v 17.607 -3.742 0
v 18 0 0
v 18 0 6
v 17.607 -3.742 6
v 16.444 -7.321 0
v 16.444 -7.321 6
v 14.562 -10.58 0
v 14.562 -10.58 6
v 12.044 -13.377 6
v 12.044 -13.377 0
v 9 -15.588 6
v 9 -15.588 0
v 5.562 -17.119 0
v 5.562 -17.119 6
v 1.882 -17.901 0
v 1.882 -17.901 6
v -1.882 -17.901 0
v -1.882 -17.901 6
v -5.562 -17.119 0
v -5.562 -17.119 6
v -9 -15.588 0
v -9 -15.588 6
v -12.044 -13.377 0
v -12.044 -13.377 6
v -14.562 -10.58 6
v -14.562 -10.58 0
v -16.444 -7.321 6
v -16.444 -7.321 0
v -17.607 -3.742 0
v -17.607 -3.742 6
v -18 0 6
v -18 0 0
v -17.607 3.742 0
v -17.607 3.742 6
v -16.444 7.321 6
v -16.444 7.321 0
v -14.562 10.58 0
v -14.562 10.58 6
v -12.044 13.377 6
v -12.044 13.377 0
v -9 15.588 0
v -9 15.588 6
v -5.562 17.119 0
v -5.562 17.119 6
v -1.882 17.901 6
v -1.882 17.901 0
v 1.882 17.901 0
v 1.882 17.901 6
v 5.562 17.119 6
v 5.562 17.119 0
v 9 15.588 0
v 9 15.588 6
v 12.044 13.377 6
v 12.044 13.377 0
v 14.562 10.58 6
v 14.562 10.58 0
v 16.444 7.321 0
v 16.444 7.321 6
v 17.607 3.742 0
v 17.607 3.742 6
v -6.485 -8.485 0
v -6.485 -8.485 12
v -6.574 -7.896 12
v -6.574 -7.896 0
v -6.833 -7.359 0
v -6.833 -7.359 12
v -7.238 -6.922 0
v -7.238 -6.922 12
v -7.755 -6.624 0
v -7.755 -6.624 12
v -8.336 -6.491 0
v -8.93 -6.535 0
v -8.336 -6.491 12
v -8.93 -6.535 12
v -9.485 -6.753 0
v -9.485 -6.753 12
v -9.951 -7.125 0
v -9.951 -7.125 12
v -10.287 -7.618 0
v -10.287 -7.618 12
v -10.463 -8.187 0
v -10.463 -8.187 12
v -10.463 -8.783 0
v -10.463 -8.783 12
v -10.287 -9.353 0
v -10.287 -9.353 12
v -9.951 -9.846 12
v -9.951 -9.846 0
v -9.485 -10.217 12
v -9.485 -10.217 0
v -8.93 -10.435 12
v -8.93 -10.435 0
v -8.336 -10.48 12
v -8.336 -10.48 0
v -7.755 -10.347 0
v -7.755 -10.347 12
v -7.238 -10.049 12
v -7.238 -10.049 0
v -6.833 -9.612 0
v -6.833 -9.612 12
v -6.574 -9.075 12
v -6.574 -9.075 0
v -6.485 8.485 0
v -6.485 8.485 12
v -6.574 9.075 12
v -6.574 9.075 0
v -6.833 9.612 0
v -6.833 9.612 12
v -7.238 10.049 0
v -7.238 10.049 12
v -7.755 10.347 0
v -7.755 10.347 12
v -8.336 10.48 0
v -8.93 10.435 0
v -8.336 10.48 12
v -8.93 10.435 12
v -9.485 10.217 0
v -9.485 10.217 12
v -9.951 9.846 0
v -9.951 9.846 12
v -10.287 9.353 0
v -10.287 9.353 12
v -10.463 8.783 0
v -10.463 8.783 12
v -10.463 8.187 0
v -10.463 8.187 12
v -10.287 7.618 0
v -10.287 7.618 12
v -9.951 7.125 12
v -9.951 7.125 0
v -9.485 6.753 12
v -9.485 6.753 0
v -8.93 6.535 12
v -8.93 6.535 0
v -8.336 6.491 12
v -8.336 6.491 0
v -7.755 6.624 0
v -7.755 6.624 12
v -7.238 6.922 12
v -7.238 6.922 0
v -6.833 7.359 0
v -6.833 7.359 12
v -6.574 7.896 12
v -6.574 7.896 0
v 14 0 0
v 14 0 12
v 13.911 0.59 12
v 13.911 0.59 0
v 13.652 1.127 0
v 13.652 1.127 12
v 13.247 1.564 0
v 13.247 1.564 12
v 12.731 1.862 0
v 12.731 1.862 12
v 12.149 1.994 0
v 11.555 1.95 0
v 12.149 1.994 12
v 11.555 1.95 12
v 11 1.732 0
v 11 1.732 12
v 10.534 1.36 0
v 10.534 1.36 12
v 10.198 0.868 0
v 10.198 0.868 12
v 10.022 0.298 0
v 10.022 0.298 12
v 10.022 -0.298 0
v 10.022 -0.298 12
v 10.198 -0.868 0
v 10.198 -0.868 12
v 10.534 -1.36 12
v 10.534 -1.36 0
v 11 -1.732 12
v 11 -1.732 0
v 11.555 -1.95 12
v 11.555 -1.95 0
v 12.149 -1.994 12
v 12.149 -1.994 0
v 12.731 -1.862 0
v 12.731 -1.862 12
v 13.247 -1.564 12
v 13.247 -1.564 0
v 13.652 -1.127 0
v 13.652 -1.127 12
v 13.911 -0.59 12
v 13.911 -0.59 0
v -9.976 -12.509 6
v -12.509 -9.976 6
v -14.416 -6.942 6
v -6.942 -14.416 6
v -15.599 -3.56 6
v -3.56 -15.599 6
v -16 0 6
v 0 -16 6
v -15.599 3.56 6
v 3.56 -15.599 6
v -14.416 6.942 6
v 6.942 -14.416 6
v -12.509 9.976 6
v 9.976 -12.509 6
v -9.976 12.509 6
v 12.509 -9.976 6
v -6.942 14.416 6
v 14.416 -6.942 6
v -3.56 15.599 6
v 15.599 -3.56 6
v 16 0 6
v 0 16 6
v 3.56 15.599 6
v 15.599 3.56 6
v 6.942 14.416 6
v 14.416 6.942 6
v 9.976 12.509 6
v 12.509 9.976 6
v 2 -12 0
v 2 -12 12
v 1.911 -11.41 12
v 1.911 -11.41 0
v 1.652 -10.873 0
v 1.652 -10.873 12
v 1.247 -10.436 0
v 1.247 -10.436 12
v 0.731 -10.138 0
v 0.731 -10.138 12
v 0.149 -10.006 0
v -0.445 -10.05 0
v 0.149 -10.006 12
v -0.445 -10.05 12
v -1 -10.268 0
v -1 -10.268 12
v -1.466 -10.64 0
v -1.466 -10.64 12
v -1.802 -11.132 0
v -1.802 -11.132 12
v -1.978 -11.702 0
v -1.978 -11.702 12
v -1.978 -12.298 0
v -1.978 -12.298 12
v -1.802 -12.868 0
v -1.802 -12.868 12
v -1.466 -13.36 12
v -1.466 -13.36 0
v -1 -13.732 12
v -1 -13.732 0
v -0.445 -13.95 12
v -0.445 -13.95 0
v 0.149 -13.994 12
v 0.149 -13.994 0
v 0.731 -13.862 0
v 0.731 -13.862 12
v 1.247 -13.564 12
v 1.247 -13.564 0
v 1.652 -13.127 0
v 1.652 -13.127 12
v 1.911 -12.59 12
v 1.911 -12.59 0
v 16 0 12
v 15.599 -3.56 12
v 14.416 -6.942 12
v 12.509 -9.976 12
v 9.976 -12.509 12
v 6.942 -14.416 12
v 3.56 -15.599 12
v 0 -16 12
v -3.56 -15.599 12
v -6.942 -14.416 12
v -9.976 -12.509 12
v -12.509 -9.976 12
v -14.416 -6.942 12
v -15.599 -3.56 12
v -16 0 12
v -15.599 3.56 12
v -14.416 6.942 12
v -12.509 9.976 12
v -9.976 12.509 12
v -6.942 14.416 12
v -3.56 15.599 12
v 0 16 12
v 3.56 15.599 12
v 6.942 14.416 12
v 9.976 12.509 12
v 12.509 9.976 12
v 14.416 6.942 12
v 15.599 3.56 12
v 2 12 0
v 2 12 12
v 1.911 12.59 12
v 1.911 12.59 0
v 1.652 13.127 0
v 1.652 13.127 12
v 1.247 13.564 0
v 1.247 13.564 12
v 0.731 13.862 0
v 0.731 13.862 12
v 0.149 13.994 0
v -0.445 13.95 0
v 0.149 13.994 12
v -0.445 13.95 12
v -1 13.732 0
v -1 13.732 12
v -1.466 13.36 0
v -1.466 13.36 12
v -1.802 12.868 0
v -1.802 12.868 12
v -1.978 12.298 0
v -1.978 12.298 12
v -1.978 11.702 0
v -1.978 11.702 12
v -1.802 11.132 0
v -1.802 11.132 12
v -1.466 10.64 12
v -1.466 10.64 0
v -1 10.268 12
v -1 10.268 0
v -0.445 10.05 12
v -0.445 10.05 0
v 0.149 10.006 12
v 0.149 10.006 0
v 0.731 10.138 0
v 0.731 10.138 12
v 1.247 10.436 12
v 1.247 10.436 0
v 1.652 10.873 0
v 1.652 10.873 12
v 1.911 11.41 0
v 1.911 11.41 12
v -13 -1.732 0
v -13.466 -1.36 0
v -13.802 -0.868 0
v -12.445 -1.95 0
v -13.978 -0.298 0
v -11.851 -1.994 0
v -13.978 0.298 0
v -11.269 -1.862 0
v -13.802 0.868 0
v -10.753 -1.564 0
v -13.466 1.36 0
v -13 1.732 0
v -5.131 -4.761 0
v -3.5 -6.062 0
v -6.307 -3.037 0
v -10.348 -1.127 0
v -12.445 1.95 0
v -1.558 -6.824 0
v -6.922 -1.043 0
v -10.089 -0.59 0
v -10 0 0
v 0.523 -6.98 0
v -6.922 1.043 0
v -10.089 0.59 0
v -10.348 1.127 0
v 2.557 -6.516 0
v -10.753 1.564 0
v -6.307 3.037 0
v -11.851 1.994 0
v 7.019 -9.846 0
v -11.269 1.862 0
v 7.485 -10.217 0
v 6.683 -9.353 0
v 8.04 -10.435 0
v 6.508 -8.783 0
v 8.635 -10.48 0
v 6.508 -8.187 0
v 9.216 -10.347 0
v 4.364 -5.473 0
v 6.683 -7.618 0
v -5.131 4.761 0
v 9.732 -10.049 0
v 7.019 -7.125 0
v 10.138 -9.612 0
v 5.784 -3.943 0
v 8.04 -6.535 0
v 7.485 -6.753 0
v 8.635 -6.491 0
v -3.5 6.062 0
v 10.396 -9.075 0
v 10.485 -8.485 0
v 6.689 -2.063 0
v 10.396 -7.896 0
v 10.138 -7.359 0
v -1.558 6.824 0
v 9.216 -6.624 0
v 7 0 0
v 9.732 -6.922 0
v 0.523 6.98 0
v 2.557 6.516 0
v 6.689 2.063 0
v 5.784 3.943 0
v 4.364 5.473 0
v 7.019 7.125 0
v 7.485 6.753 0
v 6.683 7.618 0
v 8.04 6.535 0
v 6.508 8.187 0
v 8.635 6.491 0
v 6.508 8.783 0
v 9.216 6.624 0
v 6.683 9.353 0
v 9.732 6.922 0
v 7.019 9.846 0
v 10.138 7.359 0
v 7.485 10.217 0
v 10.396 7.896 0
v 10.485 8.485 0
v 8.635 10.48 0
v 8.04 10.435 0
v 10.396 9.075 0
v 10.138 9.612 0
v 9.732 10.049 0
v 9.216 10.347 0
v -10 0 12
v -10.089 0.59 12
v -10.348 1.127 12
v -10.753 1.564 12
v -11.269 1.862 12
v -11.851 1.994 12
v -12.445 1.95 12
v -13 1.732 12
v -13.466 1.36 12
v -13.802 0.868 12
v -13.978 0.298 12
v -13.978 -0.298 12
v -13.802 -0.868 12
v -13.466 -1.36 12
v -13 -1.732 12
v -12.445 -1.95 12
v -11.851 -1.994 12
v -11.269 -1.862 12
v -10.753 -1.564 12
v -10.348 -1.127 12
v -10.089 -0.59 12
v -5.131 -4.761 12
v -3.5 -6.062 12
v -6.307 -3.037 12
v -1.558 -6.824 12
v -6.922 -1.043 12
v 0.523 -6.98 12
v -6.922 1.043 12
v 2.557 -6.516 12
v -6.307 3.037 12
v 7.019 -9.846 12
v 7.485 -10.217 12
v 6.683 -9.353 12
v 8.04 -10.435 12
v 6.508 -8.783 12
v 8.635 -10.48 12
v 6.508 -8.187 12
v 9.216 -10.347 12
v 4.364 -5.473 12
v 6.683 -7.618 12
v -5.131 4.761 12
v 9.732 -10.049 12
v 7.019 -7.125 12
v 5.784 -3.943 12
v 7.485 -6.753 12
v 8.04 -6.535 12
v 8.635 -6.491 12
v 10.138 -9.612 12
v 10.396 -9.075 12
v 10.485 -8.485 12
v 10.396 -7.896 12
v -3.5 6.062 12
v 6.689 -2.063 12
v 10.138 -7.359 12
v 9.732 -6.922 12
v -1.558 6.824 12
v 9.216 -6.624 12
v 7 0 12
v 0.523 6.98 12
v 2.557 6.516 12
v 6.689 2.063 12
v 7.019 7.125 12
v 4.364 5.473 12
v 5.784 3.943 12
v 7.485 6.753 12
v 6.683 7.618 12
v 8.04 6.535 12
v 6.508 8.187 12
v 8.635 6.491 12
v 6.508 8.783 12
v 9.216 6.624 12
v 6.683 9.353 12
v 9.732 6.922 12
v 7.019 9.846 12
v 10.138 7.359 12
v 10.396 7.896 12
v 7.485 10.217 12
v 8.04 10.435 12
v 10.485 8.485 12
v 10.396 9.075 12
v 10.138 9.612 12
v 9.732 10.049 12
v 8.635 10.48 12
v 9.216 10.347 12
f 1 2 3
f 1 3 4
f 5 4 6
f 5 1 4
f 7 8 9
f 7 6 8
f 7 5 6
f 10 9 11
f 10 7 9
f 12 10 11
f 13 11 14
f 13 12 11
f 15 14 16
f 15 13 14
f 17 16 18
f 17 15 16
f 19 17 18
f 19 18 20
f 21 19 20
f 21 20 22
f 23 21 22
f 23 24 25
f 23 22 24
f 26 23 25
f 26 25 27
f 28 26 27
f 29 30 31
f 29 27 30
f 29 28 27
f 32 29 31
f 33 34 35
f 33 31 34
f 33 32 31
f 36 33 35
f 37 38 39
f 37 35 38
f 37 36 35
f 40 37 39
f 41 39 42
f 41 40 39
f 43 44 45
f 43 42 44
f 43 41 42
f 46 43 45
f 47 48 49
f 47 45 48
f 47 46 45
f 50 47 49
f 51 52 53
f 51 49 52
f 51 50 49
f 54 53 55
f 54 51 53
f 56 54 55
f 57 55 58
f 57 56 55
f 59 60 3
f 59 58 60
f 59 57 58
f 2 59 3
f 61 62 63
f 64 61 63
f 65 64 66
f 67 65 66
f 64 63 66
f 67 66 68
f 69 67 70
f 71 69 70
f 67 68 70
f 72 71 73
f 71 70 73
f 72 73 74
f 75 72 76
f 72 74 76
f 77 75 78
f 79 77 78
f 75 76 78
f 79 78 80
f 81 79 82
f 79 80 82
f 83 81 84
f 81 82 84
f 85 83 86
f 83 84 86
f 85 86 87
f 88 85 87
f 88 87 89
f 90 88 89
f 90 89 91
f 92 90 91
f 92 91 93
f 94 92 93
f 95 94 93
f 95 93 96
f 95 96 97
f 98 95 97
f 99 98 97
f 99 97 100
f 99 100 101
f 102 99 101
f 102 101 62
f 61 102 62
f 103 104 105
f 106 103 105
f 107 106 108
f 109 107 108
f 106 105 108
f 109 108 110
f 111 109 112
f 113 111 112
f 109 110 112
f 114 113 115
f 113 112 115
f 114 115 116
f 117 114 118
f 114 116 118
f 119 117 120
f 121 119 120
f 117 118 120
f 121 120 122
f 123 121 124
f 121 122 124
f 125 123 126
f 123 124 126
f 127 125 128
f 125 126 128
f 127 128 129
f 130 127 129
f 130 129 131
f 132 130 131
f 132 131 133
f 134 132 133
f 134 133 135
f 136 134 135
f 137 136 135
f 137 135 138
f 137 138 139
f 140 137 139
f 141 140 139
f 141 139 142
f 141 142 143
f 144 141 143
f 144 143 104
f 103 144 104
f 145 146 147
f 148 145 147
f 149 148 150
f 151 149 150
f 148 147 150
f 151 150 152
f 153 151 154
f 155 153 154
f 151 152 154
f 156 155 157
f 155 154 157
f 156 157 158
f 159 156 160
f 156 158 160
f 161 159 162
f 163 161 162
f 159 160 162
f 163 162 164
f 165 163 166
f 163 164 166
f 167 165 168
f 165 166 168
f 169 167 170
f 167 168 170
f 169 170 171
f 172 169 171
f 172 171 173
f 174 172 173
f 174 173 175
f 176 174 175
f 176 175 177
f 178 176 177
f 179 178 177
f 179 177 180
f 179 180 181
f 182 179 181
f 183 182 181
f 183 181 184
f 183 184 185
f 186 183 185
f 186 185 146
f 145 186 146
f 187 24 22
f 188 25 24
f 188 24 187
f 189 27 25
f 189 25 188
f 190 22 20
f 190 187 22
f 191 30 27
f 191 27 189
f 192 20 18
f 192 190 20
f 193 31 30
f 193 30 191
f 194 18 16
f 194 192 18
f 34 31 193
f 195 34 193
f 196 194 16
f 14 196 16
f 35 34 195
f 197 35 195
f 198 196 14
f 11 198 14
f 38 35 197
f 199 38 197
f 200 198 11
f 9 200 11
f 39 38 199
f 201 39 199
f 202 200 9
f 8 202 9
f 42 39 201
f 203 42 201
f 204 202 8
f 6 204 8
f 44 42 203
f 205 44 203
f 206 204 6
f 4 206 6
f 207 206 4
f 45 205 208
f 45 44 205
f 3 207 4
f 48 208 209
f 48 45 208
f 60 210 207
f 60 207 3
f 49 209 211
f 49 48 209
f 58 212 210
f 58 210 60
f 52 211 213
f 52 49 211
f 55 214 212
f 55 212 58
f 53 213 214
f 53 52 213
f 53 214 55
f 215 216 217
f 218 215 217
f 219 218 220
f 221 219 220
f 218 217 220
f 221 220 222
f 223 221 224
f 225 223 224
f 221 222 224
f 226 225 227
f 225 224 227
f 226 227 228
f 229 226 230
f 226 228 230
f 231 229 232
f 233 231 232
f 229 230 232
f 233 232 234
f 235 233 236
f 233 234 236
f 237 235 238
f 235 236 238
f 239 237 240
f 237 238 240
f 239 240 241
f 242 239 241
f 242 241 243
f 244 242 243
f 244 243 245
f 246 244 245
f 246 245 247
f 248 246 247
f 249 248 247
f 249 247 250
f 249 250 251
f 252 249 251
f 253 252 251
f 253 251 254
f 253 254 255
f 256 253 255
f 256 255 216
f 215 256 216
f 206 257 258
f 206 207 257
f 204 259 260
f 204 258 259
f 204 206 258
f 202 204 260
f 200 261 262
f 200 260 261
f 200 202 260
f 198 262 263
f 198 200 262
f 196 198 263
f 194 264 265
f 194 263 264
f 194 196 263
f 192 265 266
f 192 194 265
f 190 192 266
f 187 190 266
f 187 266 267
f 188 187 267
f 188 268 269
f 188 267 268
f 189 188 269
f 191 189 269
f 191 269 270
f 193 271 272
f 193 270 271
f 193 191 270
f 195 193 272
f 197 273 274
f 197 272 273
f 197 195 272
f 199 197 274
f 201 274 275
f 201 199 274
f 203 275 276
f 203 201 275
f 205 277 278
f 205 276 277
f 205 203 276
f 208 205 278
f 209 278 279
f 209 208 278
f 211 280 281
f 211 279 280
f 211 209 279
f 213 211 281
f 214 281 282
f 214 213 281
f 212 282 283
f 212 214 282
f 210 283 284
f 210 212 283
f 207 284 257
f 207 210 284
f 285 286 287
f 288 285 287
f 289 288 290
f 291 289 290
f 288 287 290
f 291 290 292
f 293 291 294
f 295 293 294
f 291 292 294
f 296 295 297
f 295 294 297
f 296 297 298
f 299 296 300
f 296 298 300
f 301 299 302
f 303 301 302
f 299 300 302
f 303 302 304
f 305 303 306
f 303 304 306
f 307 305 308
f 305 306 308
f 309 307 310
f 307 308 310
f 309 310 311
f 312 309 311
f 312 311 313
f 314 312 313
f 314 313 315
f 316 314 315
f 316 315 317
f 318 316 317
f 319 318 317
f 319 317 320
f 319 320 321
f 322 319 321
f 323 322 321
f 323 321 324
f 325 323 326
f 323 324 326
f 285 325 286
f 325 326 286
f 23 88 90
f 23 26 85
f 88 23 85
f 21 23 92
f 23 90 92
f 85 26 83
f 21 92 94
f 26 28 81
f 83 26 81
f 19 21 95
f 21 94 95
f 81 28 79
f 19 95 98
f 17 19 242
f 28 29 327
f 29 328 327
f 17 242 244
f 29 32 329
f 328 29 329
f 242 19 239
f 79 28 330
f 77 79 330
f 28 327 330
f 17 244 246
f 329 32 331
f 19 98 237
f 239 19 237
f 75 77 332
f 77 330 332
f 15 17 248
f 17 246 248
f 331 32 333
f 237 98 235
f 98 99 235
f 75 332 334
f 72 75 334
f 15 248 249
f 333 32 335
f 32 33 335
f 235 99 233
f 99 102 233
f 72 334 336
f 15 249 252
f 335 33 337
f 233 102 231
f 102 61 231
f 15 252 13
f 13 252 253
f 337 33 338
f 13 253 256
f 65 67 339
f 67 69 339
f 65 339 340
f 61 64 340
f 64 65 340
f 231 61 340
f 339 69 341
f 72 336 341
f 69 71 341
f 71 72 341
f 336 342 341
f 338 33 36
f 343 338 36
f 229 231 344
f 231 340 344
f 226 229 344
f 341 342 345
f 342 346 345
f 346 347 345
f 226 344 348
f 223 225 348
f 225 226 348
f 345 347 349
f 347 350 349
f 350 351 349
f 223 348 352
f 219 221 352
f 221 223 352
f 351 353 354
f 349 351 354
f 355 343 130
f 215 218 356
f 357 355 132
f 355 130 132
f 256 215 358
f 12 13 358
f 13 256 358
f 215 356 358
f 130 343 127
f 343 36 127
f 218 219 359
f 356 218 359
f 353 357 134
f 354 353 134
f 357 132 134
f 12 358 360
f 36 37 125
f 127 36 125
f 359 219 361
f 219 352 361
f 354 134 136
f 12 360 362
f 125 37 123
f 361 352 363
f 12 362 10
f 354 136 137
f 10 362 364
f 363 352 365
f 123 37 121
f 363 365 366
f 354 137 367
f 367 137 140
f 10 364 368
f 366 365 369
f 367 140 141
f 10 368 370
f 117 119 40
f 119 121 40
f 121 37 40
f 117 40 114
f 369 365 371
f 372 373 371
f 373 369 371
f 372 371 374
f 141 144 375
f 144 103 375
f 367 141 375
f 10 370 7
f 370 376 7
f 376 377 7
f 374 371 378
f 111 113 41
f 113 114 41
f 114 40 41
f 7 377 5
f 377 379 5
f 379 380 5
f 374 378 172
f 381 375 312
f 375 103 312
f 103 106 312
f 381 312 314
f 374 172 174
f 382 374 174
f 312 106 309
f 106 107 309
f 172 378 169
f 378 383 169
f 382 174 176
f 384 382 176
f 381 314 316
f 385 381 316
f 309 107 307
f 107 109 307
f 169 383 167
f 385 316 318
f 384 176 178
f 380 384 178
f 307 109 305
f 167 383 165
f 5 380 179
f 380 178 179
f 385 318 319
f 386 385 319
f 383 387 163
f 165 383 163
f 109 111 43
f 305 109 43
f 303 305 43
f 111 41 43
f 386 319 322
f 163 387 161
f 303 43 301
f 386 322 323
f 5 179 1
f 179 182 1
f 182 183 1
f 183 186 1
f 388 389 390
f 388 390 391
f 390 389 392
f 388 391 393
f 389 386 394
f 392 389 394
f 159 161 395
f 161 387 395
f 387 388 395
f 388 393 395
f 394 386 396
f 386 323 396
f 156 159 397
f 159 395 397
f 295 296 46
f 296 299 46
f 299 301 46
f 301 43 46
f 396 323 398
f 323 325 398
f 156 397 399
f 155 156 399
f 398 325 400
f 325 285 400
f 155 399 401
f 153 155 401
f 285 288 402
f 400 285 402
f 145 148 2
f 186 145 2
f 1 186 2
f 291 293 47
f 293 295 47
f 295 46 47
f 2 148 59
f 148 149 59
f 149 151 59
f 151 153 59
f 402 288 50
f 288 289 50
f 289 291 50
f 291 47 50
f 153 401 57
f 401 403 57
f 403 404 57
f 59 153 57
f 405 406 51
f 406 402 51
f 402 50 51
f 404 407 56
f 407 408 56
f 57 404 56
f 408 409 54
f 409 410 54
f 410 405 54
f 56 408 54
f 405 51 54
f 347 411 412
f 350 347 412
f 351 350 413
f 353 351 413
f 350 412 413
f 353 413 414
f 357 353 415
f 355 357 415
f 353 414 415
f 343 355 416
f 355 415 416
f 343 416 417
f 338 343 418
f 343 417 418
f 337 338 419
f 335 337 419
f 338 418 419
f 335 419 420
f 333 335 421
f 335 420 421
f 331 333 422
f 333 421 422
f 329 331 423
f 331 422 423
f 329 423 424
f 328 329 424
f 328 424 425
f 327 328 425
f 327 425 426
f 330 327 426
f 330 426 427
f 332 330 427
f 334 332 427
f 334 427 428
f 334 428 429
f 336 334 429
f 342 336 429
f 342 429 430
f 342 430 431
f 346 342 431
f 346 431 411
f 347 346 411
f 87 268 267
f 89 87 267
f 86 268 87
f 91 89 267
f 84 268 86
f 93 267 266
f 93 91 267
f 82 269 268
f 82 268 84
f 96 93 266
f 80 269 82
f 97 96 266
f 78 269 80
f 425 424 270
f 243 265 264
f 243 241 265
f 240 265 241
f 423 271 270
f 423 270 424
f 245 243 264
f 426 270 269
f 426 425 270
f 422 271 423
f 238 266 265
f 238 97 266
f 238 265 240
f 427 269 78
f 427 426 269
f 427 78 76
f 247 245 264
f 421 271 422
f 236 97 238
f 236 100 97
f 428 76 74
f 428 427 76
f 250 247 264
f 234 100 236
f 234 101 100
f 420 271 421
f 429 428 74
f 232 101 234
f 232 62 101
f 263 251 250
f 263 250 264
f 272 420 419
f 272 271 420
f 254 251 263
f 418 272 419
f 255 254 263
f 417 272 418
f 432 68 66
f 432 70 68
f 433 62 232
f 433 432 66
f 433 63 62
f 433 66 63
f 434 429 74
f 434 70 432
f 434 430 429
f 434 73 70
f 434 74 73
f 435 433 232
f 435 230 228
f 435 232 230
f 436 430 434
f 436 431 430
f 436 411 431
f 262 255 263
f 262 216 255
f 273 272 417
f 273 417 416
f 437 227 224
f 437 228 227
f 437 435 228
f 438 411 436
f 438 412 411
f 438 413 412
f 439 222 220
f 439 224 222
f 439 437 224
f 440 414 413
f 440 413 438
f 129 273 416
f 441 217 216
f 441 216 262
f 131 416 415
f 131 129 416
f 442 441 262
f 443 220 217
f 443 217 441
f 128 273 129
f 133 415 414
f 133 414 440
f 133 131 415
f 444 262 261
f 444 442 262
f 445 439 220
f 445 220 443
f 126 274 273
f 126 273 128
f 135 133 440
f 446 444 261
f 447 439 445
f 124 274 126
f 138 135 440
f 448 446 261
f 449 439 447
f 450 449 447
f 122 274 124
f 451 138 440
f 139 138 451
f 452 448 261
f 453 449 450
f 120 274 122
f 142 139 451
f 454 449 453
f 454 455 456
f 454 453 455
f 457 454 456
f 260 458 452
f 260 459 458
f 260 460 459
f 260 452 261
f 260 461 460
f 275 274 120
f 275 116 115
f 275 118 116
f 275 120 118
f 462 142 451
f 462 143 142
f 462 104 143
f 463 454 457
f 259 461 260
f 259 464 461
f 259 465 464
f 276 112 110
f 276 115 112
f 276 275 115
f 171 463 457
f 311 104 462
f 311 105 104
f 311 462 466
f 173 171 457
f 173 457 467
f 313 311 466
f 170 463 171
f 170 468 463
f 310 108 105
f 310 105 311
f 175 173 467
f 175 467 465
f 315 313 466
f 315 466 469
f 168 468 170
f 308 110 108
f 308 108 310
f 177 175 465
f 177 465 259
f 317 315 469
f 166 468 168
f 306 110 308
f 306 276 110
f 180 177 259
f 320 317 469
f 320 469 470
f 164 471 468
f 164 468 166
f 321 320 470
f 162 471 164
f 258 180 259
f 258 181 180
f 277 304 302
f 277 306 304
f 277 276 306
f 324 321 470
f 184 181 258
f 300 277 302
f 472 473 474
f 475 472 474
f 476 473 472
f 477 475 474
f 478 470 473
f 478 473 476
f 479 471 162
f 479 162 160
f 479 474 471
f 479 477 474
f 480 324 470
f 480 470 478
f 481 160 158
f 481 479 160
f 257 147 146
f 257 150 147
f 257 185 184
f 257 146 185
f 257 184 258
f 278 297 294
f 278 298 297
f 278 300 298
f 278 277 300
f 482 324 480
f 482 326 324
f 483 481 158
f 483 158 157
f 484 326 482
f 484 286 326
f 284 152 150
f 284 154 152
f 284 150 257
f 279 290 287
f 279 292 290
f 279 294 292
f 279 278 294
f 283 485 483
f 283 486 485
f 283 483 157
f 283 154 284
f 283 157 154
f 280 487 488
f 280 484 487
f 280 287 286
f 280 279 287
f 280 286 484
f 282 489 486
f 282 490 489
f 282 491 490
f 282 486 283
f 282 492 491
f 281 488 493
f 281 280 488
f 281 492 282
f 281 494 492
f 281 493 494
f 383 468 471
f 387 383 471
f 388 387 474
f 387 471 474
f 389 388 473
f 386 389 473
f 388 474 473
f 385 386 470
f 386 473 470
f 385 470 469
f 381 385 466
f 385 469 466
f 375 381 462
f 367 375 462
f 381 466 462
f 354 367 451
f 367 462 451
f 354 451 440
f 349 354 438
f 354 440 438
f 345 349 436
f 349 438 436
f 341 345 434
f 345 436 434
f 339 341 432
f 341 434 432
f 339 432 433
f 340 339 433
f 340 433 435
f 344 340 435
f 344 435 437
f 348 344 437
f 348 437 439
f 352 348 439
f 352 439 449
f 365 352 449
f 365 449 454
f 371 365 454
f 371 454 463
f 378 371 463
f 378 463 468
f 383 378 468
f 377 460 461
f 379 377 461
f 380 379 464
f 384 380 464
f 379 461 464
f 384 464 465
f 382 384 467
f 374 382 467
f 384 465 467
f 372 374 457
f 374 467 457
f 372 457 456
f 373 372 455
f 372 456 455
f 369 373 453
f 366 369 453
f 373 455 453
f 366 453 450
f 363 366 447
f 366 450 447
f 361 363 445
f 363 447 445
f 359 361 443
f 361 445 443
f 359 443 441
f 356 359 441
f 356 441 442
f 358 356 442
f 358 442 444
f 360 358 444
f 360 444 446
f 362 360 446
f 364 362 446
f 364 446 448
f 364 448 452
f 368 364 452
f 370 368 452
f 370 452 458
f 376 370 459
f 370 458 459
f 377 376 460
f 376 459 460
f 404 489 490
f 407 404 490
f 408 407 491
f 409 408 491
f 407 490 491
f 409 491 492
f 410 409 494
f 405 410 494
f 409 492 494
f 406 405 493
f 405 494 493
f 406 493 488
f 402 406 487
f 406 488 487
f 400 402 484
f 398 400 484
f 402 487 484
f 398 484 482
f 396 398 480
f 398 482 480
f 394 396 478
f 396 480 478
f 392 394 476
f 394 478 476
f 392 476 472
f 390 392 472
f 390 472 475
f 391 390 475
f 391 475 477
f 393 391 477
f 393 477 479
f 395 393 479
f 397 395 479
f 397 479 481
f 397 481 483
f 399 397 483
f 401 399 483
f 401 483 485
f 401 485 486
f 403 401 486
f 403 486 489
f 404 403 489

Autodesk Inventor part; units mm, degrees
ref_plane "YZ Plane" through (0, 0, 0) normal (1, 0, 0) x (0, 1, 0)
ref_plane "XZ Plane" through (0, 0, 0) normal (0, 1, 0) x (-1, 0, 0)
ref_plane "XY Plane" through (0, 0, 0) normal (0, 0, 1) x (1, 0, 0)
sketch "Sketch1" plane through (0, 0, 0) normal (0, 0, 1) x (1, 0, 0)
  circle A0 centre (0, 0) radius 18
  dimension "d0" = 36
extrude "Extrusion1" add sketch "Sketch1" along normal blind 6
sketch "Sketch2" plane through (0, 0, 6) normal (0, 0, 1) x (1, 0, 0)
  circle A0 centre (0, 0) radius 16
  dimension "d3" = 32
extrude "Extrusion2" add sketch "Sketch2" along normal blind 6
sketch "Sketch3" plane through (0, 0, 12) normal (0, 0, 1) x (1, 0, 0)
  circle A0 centre (0, 0) radius 7
  circle A1 centre (-8.4853, 8.4853) radius 2
  circle A2 centre (-12, 0) radius 2
  circle A3 centre (-8.4853, -8.4853) radius 2
  circle A4 centre (0, -12) radius 2
  line L0 (-8.4853, 8.4853) -> (0, 0) construction
  line L1 (-7, 0) -> (0, 0) construction
  circle A5 centre (8.4853, -8.4853) radius 2
  circle A6 centre (12, 0) radius 2
  circle A7 centre (8.4853, 8.4853) radius 2
  circle A8 centre (0, 12) radius 2
  dimension "d6" = 14
  dimension "d7" = 4
  dimension "d12" = 360
  dimension "d16" = 45
  dimension "d17" = 12
extrude "Extrusion3" cut sketch "Sketch3" against normal through all
properties part number "SecondStageArmClamp" material "PC/ABS Plastic"
